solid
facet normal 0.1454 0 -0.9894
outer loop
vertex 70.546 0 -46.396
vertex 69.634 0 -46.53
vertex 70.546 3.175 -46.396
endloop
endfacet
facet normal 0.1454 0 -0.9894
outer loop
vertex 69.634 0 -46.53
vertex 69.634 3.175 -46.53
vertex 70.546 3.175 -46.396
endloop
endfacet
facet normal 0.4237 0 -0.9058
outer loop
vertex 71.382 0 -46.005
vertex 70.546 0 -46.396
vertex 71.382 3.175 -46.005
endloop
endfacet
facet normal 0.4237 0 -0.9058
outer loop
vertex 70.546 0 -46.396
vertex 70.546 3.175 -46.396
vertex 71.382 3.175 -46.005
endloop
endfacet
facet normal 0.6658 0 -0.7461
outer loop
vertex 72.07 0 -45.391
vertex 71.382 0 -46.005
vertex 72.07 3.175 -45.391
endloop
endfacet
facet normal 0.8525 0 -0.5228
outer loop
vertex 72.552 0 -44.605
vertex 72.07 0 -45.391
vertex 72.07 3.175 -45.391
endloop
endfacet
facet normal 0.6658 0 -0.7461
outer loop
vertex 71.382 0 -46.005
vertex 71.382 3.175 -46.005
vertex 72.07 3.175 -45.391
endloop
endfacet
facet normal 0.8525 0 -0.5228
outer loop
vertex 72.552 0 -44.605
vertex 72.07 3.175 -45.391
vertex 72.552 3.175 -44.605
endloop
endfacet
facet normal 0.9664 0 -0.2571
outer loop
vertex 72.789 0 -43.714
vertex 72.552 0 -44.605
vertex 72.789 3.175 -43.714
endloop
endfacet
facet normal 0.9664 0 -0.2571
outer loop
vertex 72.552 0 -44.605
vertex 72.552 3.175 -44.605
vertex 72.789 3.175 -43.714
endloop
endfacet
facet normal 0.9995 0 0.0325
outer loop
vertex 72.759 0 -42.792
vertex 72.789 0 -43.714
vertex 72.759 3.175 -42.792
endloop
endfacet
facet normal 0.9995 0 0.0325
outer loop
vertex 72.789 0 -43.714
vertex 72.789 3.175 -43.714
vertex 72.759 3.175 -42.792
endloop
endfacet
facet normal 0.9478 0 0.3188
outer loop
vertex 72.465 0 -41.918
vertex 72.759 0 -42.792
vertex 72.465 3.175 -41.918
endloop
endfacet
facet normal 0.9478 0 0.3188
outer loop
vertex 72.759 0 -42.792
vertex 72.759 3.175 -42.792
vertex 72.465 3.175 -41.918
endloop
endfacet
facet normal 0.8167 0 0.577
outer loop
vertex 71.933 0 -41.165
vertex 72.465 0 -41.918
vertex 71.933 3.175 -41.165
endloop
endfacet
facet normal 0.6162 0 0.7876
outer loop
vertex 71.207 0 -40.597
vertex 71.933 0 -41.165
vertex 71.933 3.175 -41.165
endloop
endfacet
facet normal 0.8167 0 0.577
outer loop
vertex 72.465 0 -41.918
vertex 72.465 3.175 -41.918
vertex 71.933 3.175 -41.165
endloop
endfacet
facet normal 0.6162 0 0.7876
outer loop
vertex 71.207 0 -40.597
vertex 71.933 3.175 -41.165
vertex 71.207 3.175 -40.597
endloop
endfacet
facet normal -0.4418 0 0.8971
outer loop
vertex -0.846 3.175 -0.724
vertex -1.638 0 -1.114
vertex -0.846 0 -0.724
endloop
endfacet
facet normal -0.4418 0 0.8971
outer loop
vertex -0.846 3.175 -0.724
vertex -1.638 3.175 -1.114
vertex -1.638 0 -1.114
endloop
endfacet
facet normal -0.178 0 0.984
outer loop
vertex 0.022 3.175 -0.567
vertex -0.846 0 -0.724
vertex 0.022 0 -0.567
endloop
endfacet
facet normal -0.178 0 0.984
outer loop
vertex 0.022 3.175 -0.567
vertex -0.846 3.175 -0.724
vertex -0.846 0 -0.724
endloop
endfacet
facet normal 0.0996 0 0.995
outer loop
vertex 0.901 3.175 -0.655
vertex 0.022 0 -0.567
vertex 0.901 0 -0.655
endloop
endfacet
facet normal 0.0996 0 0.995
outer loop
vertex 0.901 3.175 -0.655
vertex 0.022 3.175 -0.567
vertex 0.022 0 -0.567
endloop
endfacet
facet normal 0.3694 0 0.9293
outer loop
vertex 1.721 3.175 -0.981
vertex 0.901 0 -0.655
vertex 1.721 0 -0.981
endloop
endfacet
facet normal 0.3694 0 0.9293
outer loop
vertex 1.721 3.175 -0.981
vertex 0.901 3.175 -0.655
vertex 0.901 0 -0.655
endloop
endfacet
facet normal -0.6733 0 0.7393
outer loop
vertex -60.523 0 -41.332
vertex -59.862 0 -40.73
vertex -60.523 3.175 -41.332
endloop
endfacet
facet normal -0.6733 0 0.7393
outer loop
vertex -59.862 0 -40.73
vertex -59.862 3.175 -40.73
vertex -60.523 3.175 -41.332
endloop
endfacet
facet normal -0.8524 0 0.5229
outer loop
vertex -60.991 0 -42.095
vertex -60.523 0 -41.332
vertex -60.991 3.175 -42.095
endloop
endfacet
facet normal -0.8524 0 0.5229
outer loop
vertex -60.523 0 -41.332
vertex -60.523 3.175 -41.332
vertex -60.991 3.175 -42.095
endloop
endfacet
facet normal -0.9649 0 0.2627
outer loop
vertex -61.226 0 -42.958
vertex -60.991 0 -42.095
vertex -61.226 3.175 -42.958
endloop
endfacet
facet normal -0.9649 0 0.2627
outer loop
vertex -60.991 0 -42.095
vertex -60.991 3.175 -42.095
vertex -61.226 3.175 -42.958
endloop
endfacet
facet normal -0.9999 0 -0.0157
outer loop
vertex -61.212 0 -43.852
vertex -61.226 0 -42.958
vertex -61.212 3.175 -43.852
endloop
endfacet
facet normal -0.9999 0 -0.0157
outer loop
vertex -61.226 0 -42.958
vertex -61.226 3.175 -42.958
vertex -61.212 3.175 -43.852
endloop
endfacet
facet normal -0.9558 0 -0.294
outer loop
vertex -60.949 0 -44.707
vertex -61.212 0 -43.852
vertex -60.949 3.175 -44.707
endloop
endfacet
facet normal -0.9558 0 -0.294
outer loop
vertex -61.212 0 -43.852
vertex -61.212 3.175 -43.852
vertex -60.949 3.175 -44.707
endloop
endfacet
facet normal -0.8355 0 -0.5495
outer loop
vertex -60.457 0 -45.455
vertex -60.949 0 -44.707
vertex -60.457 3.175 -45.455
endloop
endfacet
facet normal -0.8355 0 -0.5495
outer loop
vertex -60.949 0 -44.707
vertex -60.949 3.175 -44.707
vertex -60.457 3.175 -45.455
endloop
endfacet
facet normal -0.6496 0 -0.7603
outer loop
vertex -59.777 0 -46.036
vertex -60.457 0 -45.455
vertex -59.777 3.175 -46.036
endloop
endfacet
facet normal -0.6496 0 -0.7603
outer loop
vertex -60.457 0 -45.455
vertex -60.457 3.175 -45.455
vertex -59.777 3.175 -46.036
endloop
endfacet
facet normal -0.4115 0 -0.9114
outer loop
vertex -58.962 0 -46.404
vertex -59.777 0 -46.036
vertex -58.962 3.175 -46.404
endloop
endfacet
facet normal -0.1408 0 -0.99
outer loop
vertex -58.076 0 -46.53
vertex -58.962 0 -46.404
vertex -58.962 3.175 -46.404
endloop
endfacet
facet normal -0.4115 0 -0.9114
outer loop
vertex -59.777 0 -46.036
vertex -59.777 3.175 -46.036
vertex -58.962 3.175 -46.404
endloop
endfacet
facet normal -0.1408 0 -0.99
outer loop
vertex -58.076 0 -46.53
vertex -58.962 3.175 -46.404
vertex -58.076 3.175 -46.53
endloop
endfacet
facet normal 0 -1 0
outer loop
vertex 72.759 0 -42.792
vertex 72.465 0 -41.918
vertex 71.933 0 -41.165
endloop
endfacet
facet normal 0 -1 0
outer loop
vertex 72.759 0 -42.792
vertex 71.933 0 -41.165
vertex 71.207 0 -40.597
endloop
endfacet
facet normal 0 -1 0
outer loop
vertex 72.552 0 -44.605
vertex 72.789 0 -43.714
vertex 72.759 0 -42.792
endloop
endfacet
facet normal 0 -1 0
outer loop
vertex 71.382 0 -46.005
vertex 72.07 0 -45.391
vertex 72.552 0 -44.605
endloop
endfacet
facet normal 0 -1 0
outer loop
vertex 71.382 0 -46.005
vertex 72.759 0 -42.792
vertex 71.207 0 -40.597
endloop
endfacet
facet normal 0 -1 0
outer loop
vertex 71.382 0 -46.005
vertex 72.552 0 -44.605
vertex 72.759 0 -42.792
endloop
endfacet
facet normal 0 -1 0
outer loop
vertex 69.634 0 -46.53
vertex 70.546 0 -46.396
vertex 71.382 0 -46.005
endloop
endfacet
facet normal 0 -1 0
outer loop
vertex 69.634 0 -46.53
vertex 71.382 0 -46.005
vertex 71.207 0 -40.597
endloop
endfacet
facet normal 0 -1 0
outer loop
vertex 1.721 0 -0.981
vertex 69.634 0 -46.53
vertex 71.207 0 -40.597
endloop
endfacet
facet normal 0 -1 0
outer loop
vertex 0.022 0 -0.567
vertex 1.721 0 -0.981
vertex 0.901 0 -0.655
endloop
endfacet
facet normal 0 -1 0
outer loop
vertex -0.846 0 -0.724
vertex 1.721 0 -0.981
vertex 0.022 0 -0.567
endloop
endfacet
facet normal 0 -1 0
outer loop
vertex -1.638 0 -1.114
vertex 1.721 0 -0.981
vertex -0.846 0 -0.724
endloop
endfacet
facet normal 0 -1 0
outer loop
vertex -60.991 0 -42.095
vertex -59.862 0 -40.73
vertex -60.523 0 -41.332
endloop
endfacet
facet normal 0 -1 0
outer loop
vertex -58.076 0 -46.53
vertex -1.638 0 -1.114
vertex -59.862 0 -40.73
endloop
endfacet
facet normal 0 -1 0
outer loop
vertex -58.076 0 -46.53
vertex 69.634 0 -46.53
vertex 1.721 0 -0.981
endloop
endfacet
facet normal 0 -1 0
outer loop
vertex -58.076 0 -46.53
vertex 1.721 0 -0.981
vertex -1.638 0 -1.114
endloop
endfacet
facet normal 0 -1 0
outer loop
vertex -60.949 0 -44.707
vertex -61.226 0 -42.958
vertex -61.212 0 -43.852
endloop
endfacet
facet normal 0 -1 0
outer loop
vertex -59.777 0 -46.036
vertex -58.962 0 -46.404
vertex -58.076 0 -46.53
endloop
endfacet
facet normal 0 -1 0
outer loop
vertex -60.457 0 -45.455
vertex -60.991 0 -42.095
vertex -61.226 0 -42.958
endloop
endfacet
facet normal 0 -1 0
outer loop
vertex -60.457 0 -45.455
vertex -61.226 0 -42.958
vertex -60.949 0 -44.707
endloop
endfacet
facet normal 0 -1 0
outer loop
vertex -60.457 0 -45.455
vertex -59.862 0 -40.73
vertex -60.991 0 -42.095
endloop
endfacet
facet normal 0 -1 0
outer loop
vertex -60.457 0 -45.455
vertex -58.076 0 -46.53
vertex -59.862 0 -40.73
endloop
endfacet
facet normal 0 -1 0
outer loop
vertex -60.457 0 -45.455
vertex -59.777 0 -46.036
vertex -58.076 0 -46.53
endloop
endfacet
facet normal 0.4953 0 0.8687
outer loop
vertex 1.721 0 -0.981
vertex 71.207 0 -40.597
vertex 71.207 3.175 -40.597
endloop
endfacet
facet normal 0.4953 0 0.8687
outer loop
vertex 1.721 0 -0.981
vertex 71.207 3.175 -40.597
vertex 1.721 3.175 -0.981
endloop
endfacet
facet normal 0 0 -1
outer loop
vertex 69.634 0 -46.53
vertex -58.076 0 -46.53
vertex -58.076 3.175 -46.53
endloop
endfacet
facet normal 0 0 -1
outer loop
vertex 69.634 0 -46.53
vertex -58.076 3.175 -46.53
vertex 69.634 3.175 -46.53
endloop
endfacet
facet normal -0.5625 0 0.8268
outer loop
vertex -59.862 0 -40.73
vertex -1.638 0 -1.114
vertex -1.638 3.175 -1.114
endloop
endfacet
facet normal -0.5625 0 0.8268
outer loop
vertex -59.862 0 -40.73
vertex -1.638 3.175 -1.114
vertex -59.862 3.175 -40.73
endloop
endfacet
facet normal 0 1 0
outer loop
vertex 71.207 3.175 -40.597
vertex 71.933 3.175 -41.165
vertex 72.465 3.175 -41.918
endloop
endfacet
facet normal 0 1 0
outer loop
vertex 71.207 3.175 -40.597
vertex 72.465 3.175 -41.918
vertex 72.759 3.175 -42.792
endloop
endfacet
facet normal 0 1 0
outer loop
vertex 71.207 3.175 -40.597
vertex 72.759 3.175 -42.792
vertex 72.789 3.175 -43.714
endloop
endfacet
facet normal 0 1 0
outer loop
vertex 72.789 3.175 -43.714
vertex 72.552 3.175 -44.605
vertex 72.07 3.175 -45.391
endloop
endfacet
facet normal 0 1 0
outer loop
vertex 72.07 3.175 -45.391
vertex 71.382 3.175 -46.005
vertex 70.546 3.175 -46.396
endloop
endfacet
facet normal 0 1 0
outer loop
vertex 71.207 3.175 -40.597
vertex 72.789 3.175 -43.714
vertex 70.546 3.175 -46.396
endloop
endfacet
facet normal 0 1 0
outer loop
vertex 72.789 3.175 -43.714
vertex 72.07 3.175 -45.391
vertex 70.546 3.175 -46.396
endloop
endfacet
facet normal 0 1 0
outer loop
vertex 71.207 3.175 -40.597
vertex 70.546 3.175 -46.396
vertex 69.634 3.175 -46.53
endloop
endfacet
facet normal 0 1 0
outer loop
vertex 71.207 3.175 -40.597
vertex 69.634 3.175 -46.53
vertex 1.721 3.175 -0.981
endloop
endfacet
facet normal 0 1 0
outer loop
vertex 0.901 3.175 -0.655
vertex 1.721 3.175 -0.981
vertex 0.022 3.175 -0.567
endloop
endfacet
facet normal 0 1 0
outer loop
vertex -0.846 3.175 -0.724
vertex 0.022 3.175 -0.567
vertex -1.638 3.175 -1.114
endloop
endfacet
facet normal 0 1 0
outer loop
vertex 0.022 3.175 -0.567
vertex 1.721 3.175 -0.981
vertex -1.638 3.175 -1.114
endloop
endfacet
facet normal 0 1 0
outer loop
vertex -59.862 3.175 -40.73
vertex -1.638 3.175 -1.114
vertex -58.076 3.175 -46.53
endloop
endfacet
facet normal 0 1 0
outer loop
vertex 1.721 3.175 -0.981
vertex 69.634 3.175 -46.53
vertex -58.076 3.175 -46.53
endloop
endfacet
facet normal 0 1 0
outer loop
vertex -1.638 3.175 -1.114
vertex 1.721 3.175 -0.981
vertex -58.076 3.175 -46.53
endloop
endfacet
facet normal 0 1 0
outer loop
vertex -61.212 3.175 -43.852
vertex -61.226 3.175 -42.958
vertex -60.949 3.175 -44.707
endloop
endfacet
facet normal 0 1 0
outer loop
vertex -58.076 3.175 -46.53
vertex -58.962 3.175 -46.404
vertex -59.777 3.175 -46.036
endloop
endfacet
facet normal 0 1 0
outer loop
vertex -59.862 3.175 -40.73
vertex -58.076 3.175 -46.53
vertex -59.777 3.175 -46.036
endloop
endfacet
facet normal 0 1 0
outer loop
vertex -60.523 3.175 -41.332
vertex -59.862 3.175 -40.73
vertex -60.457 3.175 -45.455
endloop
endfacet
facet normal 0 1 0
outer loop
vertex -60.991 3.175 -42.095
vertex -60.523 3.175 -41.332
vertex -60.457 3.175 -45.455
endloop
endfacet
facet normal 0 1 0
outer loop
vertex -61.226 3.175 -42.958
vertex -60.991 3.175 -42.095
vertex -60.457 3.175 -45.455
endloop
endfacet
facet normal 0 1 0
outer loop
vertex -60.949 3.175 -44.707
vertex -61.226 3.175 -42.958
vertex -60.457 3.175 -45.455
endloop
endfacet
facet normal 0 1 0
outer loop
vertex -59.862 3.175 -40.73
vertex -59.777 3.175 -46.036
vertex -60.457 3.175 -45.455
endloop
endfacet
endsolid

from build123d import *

# Parameters (mm, degrees)
BOSS_EXTRUDE1_DEPTH = 3.175
FILLET1_R           = 3.175
SKETCH2_R           = 0.712880647
BOSS_EXTRUDE2_DEPTH = 2.54


with BuildPart() as part:
    # Sketch1 → Boss-Extrude1 (new body)
    with BuildSketch(Plane(origin=(0, 0, 0), x_dir=(1, 0, 0), z_dir=(0, 1, 0))):
        Polygon((0, 0), (-68.386624181, 46.529866421), (81.613375819, 46.529866421), align=None)
    extrude(amount=BOSS_EXTRUDE1_DEPTH)

    # Fillet1
    fillet1_edges = [part.edges().sort_by_distance(p)[0] for p in [
        (0, 1.5875, 0),
        (-68.386624181, 1.5875, -46.529866421),
        (81.613375819, 1.5875, -46.529866421),
    ]]
    fillet(fillet1_edges, radius=FILLET1_R)

    # Sketch2 → Boss-Extrude2 (add)
    with BuildSketch(Plane(origin=(0, 3.175, 0), x_dir=(1, 0, 0), z_dir=(0, 1, 0))):
        with Locations((-58.076097719, 43.354866421)):
            Circle(SKETCH2_R)
    extrude(amount=-BOSS_EXTRUDE2_DEPTH)


solid = part.part
